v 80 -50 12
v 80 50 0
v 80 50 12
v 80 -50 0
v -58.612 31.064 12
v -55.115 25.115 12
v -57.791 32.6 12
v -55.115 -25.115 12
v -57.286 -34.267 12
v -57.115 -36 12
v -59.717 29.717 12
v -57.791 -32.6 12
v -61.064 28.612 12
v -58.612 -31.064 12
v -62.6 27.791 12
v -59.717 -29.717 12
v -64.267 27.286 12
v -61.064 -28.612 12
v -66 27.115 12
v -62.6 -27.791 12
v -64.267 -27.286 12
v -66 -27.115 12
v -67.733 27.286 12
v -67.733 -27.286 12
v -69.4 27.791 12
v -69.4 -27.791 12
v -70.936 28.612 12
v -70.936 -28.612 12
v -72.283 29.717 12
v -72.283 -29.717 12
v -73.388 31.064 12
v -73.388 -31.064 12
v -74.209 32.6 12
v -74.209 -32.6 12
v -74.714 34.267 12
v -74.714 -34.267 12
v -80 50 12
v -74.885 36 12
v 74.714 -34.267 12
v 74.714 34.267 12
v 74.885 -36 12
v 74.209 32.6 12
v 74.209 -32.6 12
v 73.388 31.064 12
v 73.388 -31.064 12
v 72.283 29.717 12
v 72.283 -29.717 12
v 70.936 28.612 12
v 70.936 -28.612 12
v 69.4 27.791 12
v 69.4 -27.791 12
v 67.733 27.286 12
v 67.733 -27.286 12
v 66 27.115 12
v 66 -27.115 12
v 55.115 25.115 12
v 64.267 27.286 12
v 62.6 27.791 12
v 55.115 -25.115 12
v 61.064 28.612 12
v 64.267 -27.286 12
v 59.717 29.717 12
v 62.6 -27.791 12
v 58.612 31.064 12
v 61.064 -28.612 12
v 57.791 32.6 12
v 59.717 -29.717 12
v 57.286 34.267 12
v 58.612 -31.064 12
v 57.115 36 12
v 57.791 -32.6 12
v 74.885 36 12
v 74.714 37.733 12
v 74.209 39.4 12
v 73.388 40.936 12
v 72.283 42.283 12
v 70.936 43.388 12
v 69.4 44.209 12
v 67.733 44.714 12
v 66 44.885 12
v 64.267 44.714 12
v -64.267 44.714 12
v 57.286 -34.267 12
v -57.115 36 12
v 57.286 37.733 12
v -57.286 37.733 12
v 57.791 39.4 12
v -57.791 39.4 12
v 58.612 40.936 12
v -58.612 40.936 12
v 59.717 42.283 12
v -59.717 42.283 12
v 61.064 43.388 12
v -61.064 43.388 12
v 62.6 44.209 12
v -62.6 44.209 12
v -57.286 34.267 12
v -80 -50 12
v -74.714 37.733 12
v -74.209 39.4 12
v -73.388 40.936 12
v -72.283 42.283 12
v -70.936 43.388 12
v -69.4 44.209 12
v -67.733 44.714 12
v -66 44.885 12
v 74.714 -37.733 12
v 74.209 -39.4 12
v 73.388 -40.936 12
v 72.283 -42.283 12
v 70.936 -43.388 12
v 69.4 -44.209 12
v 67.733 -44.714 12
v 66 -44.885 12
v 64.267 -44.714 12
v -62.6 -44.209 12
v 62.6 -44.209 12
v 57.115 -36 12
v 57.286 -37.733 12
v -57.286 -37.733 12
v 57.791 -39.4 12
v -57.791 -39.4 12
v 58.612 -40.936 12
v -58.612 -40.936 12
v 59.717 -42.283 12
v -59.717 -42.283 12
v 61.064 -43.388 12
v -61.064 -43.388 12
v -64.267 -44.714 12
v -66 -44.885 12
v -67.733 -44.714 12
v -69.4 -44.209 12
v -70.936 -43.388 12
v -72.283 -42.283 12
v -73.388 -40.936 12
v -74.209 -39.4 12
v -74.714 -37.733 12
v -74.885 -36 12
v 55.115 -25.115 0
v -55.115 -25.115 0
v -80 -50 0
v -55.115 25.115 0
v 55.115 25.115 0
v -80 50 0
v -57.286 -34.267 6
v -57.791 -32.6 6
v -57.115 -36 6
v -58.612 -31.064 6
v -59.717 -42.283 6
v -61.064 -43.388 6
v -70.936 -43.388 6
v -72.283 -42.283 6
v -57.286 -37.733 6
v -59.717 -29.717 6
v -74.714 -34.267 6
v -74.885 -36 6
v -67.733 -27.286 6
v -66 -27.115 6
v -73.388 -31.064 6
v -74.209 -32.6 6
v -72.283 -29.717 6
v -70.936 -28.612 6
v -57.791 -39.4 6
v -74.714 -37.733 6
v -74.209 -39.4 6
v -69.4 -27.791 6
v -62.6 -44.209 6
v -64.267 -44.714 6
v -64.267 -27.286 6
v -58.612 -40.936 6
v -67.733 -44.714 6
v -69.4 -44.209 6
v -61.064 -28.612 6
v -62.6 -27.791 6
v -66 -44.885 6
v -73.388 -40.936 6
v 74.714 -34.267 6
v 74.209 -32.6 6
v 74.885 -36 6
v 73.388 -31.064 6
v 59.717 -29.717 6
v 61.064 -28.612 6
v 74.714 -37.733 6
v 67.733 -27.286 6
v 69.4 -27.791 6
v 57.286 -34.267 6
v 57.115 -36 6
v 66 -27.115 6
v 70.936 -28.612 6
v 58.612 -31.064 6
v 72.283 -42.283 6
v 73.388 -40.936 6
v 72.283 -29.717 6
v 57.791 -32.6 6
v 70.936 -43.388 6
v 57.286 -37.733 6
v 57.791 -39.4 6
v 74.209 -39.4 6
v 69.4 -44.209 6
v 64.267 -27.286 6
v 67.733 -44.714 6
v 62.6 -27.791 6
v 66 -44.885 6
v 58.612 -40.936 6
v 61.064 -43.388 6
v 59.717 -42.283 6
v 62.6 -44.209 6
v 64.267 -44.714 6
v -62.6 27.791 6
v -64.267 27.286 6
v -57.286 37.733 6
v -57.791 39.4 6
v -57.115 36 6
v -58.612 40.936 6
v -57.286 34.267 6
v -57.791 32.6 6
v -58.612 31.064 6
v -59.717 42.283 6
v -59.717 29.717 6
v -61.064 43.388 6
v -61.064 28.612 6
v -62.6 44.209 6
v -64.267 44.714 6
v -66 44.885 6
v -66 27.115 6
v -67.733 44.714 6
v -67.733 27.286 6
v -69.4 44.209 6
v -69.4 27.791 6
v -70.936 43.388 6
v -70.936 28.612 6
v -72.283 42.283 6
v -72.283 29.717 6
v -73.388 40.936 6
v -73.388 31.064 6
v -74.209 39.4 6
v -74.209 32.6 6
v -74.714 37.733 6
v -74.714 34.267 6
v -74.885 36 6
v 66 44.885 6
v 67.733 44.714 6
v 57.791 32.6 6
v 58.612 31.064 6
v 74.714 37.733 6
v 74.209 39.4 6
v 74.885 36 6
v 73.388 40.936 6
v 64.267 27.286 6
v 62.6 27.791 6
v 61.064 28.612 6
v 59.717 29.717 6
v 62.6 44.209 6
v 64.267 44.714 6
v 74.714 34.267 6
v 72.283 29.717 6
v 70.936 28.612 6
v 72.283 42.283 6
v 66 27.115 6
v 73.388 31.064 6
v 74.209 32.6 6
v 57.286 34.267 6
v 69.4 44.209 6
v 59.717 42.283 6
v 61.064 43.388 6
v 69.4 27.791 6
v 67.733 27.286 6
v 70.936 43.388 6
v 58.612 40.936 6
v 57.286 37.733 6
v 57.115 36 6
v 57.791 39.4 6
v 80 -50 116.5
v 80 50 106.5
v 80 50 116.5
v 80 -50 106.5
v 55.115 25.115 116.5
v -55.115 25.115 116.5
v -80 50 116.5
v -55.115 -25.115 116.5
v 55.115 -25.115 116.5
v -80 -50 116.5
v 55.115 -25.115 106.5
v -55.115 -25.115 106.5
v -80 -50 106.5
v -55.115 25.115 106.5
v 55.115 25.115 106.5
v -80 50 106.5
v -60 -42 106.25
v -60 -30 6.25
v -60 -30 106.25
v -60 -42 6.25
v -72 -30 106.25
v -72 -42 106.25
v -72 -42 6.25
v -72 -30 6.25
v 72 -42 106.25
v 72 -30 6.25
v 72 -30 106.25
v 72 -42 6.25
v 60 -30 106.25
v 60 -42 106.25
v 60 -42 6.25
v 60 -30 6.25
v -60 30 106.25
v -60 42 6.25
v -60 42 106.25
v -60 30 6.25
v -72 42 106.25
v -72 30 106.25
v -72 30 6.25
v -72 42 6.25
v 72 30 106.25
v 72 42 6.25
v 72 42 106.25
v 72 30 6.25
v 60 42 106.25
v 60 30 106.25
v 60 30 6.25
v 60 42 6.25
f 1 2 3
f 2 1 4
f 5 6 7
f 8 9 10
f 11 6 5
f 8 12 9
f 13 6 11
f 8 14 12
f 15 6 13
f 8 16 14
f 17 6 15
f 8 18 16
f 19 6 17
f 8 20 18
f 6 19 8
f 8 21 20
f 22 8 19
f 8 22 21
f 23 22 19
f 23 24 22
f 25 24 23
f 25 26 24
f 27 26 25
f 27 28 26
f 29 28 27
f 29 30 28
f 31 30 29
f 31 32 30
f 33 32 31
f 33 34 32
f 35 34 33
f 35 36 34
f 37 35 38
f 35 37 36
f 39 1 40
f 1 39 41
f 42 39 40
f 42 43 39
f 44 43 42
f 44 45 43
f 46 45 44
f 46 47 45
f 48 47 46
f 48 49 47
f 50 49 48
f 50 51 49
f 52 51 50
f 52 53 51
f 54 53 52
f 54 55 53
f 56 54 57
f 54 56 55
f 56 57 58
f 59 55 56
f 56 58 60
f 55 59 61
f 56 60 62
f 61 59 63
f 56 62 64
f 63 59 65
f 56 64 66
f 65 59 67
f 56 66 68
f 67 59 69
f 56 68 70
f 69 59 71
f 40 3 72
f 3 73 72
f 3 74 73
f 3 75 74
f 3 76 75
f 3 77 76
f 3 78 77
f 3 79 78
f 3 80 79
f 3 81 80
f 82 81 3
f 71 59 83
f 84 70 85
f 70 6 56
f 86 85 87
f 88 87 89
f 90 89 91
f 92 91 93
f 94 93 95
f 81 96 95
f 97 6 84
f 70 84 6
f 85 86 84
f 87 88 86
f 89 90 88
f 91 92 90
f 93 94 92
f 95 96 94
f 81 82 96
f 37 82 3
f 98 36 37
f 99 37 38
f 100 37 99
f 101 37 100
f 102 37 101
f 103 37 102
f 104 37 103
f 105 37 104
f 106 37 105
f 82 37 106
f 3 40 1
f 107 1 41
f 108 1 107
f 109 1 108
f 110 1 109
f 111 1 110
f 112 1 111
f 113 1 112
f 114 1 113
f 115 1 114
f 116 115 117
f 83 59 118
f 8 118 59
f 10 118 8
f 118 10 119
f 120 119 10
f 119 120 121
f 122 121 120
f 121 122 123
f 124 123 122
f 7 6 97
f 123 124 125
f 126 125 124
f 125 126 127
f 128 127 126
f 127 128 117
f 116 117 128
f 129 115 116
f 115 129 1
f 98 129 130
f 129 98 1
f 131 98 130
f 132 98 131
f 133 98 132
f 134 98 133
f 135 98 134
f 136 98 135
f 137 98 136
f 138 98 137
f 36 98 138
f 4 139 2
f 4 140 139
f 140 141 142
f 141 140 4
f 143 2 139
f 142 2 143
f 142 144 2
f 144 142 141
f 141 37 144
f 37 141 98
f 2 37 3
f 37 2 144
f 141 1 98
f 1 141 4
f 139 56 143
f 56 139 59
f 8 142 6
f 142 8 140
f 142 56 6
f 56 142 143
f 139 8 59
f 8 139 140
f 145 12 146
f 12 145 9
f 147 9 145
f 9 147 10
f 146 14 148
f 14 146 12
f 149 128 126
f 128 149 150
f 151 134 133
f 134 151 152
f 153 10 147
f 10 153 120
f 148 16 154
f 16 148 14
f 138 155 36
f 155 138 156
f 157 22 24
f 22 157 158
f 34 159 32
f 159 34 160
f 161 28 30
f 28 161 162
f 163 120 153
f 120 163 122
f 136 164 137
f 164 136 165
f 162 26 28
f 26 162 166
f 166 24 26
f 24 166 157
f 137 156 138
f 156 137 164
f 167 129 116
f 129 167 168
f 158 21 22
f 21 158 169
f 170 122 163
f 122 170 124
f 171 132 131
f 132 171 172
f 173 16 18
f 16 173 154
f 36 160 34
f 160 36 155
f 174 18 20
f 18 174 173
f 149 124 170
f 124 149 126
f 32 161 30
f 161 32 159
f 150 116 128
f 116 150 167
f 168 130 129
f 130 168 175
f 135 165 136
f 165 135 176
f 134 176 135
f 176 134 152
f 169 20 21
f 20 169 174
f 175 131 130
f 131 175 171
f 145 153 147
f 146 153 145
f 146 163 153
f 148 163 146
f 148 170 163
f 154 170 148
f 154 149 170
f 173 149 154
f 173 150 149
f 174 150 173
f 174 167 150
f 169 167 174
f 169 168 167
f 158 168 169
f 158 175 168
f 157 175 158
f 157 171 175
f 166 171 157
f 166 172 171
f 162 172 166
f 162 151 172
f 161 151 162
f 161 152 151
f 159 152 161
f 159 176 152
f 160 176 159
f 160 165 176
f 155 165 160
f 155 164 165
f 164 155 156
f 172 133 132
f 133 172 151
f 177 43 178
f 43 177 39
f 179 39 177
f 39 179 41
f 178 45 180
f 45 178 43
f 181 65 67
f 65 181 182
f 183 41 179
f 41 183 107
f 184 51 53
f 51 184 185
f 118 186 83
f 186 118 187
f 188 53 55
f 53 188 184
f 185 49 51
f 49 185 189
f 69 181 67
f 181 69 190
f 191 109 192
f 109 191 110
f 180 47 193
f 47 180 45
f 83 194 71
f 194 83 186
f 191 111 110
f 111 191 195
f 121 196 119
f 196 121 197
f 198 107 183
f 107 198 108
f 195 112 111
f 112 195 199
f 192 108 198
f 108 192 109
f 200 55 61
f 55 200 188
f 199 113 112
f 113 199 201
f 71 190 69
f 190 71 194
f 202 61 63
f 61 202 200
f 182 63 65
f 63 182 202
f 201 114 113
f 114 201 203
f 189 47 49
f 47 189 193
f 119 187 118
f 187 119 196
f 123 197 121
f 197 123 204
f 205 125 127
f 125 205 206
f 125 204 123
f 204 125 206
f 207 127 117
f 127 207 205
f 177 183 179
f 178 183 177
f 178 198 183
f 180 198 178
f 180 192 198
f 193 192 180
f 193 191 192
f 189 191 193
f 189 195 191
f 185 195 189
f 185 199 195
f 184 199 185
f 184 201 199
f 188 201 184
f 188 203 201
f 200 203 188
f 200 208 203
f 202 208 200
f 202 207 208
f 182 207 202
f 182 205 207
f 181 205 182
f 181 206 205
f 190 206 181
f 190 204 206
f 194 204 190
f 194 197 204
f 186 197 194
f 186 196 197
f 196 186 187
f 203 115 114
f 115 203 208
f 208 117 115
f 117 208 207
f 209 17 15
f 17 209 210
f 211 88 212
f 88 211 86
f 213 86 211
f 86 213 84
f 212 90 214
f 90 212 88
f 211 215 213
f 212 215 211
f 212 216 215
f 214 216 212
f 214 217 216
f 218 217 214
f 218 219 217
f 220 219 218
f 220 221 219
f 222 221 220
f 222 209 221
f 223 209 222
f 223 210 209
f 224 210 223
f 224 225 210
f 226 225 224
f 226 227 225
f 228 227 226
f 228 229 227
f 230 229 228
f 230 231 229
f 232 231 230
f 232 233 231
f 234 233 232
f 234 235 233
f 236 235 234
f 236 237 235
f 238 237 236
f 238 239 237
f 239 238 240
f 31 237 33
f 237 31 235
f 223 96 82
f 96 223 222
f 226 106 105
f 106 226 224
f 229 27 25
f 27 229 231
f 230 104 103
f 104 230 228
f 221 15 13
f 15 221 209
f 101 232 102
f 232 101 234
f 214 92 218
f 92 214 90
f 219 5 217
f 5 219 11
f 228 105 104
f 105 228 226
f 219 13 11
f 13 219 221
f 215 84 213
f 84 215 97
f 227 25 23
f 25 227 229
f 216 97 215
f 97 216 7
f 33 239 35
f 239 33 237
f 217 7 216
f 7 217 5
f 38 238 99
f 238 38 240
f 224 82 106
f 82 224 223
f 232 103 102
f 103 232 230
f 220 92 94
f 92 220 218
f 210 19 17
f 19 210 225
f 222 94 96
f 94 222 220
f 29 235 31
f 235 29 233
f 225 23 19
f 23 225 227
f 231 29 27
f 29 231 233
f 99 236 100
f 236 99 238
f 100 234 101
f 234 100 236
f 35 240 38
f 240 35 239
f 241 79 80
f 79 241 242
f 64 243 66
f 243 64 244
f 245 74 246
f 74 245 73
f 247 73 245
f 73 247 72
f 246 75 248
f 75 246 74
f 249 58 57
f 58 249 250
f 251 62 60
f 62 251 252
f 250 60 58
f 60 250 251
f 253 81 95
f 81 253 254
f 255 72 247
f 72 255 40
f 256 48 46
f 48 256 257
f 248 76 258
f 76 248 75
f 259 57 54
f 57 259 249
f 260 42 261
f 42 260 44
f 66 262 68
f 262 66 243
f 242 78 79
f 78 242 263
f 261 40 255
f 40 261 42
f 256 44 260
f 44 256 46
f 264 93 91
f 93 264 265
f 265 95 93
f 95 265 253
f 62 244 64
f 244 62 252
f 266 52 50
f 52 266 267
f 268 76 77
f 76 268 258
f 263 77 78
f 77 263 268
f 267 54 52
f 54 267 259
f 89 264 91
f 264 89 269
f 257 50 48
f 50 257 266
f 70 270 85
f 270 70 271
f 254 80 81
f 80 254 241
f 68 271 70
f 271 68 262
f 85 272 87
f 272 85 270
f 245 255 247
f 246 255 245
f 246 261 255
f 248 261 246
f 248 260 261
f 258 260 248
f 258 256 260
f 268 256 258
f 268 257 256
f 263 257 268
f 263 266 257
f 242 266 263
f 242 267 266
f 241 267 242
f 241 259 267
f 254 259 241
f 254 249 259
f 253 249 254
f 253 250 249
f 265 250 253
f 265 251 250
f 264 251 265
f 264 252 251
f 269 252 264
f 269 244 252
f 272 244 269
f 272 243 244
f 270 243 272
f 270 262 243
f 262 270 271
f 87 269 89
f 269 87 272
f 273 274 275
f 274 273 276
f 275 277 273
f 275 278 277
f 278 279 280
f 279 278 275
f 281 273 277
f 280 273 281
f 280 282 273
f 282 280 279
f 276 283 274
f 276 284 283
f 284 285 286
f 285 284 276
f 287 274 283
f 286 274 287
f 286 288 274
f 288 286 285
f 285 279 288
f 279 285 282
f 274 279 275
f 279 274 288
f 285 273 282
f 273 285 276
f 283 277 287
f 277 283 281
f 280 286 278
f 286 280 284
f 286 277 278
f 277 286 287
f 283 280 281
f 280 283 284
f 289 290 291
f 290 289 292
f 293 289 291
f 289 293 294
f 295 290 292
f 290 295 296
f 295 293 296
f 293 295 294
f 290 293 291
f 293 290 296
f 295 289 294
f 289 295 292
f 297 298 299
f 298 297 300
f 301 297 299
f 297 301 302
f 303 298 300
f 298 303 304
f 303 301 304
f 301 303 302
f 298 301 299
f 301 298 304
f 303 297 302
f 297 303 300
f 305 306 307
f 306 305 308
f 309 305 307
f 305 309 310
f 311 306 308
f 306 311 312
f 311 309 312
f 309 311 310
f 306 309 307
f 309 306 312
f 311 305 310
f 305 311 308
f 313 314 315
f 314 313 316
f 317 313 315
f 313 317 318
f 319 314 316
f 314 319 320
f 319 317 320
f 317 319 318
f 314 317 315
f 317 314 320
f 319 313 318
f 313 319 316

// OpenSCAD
$fn = 32;

// ------------------------------------------------------------------------
// Frame cube: base 160 x 100 mm, posts 100 mm tall
// Every part is its own module, assembly() places every instance.
// ------------------------------------------------------------------------

// --- part 1 ---
module base_frame() {
  difference() {
    translate([-80, -50, 0]) cube([160, 100, 12]);
    translate([-55.115, -25.115, -1]) cube([110.23, 50.23, 14]);
    translate([-66, -36, 6]) cylinder(h = 7, d = 17.77);
    translate([66, -36, 6]) cylinder(h = 7, d = 17.77);
    translate([-66, 36, 6]) cylinder(h = 7, d = 17.77);
    translate([66, 36, 6]) cylinder(h = 7, d = 17.77);
  }
}

// --- part 2 ---
module corner_post() {
  translate([-6, -6, 0]) cube([12, 12, 100]);
}

// --- part 3 ---
module top_frame() {
  difference() {
    translate([-80, -50, 0]) cube([160, 100, 10]);
    translate([-55.115, -25.115, -1]) cube([110.23, 50.23, 12]);
  }
}

// --- assembly ---
module assembly() {
  color([0.80, 0.24, 0.20]) translate([0, 0, 0]) rotate([0, 0, 0]) base_frame();
  color([0.20, 0.45, 0.75]) translate([-66, -36, 6.25]) rotate([0, 0, 0]) corner_post();
  color([0.25, 0.62, 0.32]) translate([66, -36, 6.25]) rotate([0, 0, 0]) corner_post();
  color([0.92, 0.70, 0.18]) translate([-66, 36, 6.25]) rotate([0, 0, 0]) corner_post();
  color([0.58, 0.35, 0.70]) translate([66, 36, 6.25]) rotate([0, 0, 0]) corner_post();
  color([0.16, 0.66, 0.66]) translate([0, 0, 106.5]) rotate([0, 0, 0]) top_frame();
}

assembly();
